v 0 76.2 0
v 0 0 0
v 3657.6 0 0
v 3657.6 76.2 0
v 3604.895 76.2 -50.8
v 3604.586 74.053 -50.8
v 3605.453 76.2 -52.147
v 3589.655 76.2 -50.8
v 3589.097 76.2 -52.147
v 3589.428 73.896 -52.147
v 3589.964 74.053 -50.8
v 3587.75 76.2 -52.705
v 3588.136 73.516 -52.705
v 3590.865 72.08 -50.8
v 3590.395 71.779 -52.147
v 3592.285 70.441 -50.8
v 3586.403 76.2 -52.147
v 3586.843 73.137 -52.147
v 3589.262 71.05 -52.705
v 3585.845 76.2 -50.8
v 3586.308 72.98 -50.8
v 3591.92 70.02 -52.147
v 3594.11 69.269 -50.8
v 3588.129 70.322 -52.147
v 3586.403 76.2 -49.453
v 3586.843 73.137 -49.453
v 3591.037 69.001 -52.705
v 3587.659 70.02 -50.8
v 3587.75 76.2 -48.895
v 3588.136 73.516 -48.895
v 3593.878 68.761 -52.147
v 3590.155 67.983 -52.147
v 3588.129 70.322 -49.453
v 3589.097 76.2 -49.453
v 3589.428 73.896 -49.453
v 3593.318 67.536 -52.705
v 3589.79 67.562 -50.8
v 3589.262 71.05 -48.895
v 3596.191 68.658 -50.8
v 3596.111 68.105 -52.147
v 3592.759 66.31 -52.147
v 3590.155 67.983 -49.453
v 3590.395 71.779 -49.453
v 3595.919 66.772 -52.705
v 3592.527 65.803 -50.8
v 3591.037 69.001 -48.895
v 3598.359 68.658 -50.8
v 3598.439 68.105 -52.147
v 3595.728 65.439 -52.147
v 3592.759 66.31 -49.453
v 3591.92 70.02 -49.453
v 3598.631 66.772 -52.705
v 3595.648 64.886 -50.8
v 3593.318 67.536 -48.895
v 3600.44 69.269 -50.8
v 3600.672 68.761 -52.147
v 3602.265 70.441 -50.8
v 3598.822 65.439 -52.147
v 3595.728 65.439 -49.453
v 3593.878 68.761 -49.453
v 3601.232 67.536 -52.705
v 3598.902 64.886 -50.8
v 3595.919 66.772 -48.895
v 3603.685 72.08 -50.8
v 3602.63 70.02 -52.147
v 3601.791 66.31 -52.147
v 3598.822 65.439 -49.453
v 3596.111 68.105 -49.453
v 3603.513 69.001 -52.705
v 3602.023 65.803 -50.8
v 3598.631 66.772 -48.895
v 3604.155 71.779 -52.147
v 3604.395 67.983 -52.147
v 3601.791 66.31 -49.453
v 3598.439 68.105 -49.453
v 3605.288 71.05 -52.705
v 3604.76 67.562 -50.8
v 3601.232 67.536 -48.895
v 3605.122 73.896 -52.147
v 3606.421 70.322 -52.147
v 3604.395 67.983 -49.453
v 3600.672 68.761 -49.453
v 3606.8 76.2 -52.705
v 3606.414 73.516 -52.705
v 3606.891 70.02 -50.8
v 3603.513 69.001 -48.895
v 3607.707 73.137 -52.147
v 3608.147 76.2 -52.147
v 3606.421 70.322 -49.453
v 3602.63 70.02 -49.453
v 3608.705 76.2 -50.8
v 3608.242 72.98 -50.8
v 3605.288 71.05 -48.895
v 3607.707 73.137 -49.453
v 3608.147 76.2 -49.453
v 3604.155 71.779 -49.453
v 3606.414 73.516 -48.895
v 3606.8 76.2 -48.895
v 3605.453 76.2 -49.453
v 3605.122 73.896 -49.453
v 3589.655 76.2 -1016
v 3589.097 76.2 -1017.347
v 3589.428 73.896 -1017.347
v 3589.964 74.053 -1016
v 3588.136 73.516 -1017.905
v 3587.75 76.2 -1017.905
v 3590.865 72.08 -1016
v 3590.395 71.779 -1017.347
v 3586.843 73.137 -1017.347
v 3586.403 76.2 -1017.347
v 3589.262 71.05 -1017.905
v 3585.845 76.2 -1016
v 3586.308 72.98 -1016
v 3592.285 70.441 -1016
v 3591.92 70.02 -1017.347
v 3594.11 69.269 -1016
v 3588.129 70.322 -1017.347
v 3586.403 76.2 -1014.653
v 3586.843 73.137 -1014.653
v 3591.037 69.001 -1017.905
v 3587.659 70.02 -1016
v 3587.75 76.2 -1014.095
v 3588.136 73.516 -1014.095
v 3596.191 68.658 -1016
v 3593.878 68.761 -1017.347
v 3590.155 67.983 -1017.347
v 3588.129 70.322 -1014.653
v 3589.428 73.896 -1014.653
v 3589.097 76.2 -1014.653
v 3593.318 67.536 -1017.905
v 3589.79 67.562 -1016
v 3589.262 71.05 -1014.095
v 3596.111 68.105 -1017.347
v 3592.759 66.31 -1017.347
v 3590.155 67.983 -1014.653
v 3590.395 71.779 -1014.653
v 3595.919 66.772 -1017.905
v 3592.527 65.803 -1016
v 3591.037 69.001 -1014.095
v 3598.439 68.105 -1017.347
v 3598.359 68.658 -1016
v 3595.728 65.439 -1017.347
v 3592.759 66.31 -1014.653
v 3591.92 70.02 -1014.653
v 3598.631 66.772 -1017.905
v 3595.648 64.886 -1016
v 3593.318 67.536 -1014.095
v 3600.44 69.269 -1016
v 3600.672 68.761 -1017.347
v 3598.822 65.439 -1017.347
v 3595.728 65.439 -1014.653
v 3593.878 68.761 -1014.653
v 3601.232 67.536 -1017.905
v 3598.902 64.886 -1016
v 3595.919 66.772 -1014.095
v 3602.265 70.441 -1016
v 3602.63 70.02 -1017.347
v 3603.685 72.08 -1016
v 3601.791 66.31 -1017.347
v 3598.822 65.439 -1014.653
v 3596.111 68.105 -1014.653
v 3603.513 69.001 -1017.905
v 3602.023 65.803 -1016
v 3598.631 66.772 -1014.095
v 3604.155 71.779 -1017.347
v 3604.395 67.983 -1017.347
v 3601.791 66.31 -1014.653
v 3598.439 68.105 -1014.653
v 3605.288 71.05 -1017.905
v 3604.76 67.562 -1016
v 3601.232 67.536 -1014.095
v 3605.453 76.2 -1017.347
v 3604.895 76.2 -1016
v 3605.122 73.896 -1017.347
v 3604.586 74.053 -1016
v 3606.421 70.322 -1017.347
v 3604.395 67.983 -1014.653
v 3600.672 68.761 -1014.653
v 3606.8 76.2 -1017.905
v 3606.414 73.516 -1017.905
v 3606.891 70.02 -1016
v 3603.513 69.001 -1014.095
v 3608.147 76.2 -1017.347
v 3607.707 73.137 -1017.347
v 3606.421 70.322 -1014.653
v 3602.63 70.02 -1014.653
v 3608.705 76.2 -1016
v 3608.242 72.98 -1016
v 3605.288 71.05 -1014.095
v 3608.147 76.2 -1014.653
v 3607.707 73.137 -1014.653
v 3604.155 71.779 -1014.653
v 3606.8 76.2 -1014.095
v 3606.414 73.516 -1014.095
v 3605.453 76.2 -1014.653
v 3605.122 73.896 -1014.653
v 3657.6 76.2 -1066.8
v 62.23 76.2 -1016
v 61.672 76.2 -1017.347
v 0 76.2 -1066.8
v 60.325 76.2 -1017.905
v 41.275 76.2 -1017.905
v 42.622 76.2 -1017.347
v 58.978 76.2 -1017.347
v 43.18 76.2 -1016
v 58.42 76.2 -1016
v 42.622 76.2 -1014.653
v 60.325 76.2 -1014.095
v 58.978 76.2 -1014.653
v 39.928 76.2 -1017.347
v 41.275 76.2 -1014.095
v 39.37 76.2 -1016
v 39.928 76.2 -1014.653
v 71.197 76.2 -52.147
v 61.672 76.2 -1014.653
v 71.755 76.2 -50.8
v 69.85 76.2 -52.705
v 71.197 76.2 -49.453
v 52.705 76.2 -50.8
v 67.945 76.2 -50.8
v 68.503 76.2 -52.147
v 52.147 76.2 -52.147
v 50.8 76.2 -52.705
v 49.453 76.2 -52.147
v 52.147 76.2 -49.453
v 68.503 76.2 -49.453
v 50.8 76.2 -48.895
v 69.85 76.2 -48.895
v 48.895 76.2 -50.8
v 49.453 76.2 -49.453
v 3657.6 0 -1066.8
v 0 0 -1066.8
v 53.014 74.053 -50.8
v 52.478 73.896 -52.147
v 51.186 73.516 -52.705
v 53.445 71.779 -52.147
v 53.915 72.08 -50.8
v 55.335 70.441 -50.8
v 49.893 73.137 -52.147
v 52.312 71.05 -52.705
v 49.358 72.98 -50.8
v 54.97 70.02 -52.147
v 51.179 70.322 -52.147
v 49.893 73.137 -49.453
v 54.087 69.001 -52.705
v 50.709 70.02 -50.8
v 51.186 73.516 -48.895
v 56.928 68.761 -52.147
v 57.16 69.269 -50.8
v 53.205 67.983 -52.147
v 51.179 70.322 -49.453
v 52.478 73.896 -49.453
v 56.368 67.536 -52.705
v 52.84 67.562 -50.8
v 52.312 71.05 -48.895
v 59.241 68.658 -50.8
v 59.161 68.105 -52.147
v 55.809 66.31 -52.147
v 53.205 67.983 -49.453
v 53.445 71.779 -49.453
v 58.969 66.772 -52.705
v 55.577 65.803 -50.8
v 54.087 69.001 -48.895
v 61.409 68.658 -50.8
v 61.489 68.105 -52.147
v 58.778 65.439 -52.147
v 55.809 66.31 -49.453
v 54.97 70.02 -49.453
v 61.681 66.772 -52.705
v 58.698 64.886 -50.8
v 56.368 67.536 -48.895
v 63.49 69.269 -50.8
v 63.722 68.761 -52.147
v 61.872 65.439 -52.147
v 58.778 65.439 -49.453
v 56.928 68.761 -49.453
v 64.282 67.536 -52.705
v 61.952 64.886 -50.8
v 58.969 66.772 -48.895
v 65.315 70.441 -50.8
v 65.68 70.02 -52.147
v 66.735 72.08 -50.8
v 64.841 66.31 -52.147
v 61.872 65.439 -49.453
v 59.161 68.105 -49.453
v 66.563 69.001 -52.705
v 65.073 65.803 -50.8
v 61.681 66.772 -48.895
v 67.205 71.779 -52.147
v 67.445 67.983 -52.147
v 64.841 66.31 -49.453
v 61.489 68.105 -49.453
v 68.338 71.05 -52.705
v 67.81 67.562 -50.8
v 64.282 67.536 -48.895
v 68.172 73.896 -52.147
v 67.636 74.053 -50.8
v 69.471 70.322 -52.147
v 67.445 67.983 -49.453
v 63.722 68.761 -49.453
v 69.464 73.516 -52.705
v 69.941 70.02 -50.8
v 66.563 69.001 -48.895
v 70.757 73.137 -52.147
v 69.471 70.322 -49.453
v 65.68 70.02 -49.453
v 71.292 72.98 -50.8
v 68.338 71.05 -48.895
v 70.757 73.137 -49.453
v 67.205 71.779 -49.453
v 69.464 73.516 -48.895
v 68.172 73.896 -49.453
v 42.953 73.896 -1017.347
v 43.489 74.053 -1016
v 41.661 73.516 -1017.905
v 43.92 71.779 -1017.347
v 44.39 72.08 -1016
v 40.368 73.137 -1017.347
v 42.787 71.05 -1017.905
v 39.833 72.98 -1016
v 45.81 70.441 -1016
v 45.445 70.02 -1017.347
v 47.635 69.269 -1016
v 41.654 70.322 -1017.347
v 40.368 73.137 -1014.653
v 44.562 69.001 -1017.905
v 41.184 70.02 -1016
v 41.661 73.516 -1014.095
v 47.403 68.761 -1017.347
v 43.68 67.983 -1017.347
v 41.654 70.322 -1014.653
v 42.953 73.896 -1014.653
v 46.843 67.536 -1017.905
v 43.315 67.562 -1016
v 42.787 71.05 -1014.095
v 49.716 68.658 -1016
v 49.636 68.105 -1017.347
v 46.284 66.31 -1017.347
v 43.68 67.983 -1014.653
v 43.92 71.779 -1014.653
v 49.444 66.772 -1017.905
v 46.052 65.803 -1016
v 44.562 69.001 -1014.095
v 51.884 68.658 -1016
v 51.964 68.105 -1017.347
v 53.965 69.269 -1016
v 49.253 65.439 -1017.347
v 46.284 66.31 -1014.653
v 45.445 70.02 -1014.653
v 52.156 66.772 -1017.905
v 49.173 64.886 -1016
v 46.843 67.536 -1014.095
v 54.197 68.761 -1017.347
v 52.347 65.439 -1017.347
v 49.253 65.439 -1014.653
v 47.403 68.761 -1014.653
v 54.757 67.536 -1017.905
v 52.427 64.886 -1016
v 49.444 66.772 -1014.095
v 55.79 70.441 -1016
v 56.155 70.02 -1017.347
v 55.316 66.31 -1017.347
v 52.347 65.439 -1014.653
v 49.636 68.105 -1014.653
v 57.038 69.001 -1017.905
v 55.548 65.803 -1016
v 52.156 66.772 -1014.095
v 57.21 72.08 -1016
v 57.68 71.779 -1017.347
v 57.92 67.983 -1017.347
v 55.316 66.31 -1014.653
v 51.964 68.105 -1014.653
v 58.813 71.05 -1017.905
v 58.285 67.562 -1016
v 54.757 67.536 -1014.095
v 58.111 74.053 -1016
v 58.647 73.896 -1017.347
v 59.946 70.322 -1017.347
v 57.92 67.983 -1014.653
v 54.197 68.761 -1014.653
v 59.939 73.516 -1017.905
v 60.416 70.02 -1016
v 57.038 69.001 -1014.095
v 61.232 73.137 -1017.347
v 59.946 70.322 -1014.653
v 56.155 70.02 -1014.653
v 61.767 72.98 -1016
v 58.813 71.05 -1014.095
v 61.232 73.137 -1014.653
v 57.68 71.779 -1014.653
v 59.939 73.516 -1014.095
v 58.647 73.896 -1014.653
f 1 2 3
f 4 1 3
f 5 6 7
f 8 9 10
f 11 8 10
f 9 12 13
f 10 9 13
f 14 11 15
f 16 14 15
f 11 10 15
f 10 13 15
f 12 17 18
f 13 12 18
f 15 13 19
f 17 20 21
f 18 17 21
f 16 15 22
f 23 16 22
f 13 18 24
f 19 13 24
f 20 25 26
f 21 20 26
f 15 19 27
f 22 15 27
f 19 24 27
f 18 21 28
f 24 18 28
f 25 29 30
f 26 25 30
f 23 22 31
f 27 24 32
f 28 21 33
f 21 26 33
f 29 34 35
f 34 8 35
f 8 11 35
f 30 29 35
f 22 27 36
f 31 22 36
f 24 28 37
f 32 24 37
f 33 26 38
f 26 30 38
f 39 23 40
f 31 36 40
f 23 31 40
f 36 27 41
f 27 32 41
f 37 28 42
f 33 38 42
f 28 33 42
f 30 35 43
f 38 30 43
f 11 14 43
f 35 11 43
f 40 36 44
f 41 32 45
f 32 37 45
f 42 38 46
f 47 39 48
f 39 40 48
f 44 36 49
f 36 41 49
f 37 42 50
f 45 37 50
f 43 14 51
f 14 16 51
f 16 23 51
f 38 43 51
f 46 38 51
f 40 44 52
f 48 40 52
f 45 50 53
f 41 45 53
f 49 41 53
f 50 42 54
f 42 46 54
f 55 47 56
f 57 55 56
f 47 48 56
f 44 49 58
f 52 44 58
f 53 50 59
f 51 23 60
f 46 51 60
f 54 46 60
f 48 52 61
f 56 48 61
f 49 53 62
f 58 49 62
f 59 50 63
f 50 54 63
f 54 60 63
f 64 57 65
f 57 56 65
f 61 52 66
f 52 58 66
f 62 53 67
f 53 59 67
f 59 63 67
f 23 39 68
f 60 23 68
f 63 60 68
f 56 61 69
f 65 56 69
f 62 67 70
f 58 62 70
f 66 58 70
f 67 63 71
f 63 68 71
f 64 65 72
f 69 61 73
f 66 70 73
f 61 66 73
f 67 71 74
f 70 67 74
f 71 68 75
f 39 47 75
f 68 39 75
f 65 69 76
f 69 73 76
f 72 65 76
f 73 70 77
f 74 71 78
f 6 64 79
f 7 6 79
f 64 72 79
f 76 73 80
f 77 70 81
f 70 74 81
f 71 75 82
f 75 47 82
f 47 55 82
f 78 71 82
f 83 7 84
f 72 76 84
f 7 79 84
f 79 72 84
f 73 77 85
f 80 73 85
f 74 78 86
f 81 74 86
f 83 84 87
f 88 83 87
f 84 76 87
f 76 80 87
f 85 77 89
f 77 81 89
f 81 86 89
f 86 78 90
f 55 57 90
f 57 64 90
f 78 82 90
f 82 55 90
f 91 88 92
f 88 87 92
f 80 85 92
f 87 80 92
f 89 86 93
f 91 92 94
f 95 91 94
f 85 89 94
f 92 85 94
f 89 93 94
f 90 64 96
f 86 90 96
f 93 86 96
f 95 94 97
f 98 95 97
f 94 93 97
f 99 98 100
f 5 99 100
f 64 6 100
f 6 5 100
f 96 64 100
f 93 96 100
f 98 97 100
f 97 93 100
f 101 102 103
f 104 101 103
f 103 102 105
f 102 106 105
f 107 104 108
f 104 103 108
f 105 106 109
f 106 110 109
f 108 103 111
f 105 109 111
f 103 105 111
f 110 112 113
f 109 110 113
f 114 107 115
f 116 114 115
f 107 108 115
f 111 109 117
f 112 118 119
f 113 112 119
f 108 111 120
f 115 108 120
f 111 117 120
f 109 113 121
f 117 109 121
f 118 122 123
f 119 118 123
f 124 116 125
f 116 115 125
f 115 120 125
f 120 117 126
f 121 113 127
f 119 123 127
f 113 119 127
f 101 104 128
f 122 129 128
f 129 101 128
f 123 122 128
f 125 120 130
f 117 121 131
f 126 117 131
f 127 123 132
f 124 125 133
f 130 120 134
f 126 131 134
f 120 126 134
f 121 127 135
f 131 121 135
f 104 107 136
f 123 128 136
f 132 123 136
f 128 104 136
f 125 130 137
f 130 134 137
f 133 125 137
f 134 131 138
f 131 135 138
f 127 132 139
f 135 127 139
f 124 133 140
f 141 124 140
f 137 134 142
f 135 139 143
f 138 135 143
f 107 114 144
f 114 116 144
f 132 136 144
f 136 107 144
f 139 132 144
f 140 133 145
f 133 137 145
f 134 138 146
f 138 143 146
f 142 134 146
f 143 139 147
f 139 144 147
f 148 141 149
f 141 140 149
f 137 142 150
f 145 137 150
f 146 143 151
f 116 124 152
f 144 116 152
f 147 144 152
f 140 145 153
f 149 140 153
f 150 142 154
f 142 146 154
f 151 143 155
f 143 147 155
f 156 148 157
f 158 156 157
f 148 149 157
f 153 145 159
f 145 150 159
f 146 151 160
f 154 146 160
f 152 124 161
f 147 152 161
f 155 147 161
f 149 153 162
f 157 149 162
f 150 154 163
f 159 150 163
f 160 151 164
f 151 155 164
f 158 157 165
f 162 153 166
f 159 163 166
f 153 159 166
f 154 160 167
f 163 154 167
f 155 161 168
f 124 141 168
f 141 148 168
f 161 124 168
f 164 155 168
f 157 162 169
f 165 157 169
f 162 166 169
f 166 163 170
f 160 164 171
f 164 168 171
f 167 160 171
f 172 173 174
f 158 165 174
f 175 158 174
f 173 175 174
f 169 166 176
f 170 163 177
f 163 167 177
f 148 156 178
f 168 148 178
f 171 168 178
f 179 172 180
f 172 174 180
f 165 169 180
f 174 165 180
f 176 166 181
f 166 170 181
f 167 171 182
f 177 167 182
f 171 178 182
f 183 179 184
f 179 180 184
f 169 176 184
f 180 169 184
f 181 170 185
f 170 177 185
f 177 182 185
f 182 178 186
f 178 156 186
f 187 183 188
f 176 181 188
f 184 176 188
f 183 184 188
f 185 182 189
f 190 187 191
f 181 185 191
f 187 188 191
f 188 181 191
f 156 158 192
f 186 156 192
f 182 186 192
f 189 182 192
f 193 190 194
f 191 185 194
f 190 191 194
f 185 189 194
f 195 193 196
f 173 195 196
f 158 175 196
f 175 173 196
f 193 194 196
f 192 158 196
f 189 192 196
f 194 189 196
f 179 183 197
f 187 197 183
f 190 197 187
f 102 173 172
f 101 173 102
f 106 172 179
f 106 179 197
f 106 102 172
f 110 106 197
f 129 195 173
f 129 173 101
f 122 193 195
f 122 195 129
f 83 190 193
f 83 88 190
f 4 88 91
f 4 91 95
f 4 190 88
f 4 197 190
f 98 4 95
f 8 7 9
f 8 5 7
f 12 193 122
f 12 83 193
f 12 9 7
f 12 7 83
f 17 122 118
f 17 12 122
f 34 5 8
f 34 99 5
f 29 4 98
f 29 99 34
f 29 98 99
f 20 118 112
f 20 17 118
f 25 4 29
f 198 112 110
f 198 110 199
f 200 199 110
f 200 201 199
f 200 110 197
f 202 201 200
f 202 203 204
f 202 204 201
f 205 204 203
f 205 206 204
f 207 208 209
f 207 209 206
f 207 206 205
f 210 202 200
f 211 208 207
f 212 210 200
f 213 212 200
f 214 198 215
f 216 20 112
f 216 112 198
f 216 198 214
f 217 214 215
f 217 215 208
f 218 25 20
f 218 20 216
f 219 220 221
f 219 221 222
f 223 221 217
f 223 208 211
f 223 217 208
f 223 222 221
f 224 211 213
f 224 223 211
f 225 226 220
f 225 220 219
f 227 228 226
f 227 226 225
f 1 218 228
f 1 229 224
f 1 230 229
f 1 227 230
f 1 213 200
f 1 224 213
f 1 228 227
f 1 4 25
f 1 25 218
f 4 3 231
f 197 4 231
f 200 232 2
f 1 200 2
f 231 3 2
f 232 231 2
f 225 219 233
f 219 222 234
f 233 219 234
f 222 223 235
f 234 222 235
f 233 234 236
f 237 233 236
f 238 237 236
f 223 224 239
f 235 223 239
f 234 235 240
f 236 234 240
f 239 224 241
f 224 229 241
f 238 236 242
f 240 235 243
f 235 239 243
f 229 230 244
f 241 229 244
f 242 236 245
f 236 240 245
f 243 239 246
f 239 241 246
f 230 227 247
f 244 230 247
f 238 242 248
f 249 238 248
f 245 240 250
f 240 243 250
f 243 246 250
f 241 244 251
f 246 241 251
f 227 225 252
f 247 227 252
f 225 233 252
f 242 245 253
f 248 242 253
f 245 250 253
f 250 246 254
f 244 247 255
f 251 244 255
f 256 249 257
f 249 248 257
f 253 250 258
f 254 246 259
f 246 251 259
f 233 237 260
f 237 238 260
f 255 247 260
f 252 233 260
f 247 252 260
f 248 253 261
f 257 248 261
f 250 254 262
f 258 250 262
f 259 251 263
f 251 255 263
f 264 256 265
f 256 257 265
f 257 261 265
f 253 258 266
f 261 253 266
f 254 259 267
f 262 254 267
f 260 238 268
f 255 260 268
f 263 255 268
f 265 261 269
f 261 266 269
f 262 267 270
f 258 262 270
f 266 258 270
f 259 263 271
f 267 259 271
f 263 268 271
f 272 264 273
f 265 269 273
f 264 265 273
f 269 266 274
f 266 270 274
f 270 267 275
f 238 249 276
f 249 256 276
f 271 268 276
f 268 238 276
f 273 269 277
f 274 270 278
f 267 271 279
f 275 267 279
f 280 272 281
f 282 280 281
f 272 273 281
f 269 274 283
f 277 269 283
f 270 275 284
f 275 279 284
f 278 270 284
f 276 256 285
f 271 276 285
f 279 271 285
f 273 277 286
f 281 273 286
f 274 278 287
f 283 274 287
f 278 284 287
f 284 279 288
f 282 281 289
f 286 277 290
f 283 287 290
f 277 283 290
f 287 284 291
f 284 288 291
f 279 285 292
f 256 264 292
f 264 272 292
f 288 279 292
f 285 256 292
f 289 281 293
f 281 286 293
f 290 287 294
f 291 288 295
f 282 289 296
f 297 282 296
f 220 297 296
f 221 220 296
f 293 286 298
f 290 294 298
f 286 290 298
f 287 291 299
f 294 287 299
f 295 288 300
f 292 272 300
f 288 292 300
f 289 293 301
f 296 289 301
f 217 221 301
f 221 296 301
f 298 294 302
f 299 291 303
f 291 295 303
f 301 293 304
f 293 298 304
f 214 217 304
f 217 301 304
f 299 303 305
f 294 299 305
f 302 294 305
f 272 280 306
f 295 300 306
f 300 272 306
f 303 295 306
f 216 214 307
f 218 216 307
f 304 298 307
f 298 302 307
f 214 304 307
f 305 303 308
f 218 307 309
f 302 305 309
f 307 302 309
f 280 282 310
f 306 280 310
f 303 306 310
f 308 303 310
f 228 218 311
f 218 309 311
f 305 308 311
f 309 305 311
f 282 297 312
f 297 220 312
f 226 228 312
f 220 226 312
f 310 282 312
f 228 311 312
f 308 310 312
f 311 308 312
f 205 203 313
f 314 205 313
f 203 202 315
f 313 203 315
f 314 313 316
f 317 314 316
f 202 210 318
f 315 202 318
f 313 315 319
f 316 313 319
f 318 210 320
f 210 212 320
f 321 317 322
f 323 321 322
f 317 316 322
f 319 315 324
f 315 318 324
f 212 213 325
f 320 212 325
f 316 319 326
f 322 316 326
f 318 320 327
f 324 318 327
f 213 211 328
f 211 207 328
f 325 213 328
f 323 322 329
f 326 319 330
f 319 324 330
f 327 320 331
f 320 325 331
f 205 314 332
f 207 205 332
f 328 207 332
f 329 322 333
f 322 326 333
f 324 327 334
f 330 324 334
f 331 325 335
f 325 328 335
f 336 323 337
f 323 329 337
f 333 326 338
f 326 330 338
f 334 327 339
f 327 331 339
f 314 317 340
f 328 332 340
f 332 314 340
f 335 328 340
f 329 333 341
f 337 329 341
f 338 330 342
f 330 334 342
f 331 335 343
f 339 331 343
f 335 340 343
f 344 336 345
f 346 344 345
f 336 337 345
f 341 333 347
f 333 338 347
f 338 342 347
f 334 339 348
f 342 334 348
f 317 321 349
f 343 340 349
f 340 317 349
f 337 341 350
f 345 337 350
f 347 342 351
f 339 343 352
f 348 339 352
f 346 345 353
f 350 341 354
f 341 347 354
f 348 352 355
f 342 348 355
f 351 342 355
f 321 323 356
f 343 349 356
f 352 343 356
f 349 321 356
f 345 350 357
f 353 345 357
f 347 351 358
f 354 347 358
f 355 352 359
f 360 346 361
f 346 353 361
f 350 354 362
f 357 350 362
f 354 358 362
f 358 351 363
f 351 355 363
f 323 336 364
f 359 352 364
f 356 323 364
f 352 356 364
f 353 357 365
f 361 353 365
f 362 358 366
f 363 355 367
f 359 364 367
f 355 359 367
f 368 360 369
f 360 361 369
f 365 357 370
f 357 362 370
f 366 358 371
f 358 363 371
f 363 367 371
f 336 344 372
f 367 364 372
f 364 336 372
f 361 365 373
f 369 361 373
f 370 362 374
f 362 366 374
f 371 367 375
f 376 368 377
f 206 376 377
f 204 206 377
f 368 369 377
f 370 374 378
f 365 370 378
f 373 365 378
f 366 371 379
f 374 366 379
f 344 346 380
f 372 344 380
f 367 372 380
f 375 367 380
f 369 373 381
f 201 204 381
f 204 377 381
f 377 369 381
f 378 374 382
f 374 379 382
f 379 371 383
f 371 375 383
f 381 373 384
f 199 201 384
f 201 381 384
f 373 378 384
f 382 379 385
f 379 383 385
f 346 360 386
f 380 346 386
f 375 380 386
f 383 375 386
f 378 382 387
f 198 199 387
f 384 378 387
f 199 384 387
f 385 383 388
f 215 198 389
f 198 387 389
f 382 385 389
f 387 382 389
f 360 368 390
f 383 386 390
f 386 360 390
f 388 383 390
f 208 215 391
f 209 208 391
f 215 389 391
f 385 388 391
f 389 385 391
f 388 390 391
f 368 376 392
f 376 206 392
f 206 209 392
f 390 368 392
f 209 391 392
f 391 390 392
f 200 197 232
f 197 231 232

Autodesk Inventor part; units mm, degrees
ref_plane "YZ Plane" through (0, 0, 0) normal (1, 0, 0) x (0, 1, 0)
ref_plane "XZ Plane" through (0, 0, 0) normal (0, 1, 0) x (-1, 0, 0)
ref_plane "XY Plane" through (0, 0, 0) normal (0, 0, 1) x (1, 0, 0)
sketch "Sketch1" plane through (0, 0, 0) normal (0, 1, 0) x (-1, 0, 0)
  line L0 (0, 0) -> (-3657.6, 0)
  line L1 (-3657.6, 0) -> (-3657.6, -1066.8)
  line L2 (-3657.6, -1066.8) -> (0, -1066.8)
  line L3 (0, -1066.8) -> (0, 0)
  dimension "d0" = 3657.6
  dimension "d1" = 1066.8
extrude "Extrusion1" add sketch "Sketch1" along normal blind 76.2
sketch "Sketch2" plane through (0, 76.2, 0) normal (0, 1, 0) x (1, 0, 0)
  circle A0 centre (50.8, 50.8) radius 1.905
  line L0 (0, 0) -> (3657.6, 0) projected
  line L1 (0, 1066.8) -> (0, 0) projected
  line L2 (60.325, 63.6506) -> (60.325, 37.6088) construction
  dimension "d4" = 3.81
  dimension "d5" = 50.8
  dimension "d6" = 50.8
  dimension "d7" = 9.525
revolve "Revolution1" cut sketch "Sketch2" angle 180 about axis through (60.325, 76.2, -63.6506) along (0, 0, 1)
sketch "Sketch3" plane through (0, 76.2, 0) normal (0, 1, 0) x (1, 0, 0)
  circle A0 centre (50.8, 50.8) radius 1.905 projected
  line L0 (50.8, 50.8) -> (3597.275, 50.8) construction
  line L1 (3597.275, 50.8) -> (3597.275, 1016) construction
  line L2 (3597.275, 1016) -> (50.8, 1016) construction
  line L3 (50.8, 1016) -> (50.8, 50.8) construction
  line L4 (3657.6, 1066.8) -> (0, 1066.8) projected
  line L5 (3657.6, 0) -> (3657.6, 1066.8) projected
  point P0 (0, 0)
  dimension "d9" = 50.8
  dimension "d10" = 60.325
pattern_sketch "Sketch Driven Pattern1" of "Revolution1" from (60.325, 76.2, -50.8) copies at (50.8, 76.2, -1016) at (3597.275, 76.2, -1016) at (3597.275, 76.2, -50.8)
properties part number "Hanging Platform" material "Rubber, Silicone"
